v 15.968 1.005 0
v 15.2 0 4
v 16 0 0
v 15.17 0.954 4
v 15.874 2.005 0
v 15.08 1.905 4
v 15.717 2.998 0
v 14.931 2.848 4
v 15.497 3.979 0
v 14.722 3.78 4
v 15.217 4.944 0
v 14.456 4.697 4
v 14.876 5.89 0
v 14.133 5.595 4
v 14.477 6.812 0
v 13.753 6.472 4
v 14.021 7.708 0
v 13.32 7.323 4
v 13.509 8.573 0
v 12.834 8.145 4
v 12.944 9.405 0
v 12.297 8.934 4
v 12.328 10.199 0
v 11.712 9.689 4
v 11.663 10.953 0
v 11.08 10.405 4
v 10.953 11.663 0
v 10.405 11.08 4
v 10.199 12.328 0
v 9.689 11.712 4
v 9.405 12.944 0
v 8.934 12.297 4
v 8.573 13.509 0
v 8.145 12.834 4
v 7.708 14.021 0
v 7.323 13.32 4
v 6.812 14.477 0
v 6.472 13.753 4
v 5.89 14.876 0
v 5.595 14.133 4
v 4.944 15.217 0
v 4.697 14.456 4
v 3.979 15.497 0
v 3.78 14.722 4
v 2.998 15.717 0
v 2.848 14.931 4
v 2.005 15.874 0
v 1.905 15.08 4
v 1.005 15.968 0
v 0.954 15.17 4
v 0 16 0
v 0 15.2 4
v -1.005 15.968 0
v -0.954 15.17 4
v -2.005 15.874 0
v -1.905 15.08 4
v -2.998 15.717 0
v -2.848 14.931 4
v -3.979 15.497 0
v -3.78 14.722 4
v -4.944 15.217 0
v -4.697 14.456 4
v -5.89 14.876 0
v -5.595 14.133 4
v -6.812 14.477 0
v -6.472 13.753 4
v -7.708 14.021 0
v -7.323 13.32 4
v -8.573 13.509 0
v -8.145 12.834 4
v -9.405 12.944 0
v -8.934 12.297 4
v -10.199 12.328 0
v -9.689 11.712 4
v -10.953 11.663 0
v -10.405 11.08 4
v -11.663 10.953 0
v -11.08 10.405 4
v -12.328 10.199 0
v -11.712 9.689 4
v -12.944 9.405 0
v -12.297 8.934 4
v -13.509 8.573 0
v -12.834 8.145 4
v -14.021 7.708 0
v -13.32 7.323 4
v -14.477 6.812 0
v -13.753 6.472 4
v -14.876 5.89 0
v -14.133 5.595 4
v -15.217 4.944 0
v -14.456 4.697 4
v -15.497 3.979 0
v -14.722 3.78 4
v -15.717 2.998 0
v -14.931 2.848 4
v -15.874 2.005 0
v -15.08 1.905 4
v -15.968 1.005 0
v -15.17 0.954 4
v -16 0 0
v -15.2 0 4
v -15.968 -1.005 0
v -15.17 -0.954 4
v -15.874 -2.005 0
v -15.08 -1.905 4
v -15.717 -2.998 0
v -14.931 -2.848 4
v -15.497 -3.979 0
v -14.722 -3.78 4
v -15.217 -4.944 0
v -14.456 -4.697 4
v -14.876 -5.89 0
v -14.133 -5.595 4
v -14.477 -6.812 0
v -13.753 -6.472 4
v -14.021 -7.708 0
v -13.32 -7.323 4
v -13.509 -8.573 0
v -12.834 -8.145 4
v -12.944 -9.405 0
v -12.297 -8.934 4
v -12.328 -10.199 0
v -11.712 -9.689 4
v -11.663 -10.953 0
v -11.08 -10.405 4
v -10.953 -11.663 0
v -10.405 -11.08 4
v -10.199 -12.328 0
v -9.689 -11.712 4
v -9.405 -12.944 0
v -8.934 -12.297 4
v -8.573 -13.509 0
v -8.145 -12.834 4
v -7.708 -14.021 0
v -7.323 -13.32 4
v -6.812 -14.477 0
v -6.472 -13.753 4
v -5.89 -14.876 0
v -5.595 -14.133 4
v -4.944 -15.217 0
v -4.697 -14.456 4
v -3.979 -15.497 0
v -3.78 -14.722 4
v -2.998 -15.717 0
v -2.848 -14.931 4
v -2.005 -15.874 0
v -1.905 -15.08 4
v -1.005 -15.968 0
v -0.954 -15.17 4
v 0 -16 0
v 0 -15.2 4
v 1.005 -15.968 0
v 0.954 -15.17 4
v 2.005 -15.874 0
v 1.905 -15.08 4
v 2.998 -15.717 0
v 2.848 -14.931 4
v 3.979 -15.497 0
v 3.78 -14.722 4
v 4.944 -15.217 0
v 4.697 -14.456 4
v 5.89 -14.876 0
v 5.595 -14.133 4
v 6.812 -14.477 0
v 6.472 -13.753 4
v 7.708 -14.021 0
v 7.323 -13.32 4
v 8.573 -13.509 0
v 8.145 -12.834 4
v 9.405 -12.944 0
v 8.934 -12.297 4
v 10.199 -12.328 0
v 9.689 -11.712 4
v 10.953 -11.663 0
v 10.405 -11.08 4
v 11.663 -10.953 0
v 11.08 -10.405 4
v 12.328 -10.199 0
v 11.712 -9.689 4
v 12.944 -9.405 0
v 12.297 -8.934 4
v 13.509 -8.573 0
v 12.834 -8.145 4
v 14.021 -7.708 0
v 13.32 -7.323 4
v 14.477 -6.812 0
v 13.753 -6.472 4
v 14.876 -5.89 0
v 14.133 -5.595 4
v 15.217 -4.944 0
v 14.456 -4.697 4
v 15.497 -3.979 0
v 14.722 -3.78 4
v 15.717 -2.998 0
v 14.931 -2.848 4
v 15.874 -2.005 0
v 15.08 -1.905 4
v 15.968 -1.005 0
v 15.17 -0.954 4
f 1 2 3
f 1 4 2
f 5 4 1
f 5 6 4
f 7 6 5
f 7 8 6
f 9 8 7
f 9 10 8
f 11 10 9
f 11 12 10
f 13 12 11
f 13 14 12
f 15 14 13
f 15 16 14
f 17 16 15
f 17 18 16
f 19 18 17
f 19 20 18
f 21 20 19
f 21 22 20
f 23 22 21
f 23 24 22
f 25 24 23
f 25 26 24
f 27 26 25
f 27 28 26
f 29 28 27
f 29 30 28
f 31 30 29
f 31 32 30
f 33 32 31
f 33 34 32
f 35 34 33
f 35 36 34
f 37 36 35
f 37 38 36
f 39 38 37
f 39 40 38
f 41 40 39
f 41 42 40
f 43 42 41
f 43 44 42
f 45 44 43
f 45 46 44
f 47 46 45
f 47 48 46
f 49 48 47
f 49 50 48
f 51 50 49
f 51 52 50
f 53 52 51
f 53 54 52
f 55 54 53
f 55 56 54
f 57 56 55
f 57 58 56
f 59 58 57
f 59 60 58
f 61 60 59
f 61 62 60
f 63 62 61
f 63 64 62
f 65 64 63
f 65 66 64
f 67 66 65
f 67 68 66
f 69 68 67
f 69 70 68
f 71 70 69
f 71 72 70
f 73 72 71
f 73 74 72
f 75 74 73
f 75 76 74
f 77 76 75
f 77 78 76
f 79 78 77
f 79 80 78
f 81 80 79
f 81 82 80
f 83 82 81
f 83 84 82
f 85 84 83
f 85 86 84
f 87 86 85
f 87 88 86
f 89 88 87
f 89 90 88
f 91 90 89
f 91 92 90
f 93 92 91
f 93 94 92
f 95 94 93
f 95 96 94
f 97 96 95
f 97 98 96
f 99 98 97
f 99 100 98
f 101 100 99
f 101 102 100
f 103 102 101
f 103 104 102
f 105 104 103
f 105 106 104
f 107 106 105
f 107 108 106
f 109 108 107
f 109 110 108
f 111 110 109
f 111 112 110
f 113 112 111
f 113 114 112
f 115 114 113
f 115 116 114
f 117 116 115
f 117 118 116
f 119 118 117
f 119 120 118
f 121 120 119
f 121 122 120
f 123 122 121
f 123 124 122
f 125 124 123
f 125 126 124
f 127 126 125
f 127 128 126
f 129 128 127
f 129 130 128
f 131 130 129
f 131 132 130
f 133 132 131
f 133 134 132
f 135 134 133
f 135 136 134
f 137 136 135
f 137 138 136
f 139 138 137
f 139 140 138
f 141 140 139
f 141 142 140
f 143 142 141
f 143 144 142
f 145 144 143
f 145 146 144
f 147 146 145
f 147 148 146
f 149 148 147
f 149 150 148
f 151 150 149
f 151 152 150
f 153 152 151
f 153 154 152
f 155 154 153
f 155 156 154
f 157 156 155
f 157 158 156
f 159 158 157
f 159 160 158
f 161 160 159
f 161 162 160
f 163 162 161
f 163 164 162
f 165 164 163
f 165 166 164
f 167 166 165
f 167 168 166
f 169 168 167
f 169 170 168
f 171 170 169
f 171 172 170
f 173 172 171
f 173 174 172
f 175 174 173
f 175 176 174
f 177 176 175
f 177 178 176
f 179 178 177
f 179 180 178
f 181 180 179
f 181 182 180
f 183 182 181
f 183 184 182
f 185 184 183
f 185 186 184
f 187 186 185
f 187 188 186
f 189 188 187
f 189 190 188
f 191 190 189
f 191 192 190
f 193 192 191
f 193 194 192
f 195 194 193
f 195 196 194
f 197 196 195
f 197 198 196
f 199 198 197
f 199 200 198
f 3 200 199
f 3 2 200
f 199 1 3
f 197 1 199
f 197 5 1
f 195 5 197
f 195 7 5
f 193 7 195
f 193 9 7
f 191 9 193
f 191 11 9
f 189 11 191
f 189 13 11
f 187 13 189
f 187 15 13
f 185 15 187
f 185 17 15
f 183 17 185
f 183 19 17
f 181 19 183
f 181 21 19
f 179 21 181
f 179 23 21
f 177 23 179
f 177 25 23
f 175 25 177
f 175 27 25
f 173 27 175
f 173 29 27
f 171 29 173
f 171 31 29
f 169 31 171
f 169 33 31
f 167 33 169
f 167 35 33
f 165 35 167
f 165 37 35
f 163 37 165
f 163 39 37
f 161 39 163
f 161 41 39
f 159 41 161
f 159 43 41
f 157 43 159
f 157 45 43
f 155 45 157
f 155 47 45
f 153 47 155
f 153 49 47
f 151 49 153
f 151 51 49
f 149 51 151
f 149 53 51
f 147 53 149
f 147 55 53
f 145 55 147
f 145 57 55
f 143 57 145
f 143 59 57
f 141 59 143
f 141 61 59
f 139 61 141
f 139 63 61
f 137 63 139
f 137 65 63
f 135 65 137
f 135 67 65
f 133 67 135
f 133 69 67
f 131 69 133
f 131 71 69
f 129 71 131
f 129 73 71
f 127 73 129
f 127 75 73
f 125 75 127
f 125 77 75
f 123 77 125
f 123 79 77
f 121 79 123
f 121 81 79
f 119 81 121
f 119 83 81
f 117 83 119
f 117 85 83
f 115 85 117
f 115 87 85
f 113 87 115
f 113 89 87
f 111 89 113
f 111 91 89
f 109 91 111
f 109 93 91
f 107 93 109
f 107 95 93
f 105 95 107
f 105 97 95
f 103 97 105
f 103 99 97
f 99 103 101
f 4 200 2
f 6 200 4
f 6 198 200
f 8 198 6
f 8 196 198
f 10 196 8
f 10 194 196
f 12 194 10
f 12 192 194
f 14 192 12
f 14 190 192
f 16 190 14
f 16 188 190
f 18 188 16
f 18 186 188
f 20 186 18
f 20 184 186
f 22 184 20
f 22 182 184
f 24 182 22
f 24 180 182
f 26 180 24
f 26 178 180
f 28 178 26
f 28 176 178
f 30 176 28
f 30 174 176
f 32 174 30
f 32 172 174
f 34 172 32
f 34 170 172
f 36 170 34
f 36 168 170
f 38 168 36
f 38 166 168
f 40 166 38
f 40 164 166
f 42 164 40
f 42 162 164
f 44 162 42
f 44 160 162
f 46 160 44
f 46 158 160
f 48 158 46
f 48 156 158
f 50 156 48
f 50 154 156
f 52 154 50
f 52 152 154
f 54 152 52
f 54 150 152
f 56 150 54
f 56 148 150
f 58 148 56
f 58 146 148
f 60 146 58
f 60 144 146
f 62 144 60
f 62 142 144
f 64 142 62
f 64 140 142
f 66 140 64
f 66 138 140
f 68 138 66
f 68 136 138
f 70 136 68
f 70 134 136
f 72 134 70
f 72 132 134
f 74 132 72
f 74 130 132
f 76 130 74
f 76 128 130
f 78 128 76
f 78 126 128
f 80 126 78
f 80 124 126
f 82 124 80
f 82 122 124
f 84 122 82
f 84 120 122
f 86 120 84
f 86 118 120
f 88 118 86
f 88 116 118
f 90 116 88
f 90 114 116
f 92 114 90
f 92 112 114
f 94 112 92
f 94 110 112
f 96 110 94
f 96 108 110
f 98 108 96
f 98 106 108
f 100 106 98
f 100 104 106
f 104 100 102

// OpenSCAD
// file: build.scad
$build_id = "";

function building(filename) = is_undef(filename) ?
  !is_undef(build)
  : !is_undef(build) && build == filename;

function previewing() = !building();

module build(filename) {
  $build_id = filename;

  if(!is_undef(scad_build_scan) && scad_build_scan == true) {
    echo(str("scad_build_scan: ", filename));
  }
  else if(previewing() || build == filename) {
    children();
  }
}

module preview_row(spacing) {
  if(previewing()) {
    for(x = [0:1:$children - 1]) {
      translate([x * spacing, 0, 0]) {
        children(x);
      }
    }
  }
  else {
    children();
  }
}

module preview_column(spacing) {
  if(previewing()) {
    for(y = [0:1:$children - 1]) {
      translate([0, y * spacing, 0]) {
        children(y);
      }
    }
  }
  else {
    children();
  }
}
// file: minibase.scad
// Based off of titancraft's Customizable Miniature Base (CC0 1.0)
// https://www.thingiverse.com/thing:1112237

include <./build.scad>

$base_rim = 1; //	[1: tapered, 2: inclined, 3: flat]
// Number of sides:
$base_shape = 100; //	[30:Low-res Circle, 100: Hi-res Circle, 5:Pentagon, 6:Hexagon, 8:Octagon, 4:Square, 3:Triangle]

$base_diameter = 32;
$base_height = 4;
$base_slant = 95; // [50:100]

// Percentage:
$base_stretch = 100;

//('Cool' base only)
$base_inner_circle_ratio = 40; // [10:80]

module tapered(r=40) {
  $base_rim = 1;
  $base_inner_circle_ratio = r;

  children();
}

module inclined() {
  $base_rim = 2;

  children();
}

module flat() {
  $base_rim = 3;

  children();
}

module shape(s) {
  $base_shape = s;

  children();
}

module diameter(d) {
  $base_diameter = d;

  children();
}

module height(h) {
  $base_height = h;

  children();
}

module slant(s) {
  $base_slant = s;

  children();
}

module stretch(s) {
  $base_stretch = s;

  children();
}

module base(id) {
  build(id) union() {
    radius = $base_diameter/2;
    scale([$base_stretch/100, 1, 1]){
      if ($base_rim == 1){
        // tapered base
        cyl1_height = $base_height * (1-$base_inner_circle_ratio/100);
        cylinder(cyl1_height, radius, radius * $base_slant/100, $fn=$base_shape);

        cyl2_radius = radius  * $base_slant/100 * .95;
        cyl2_height = $base_height - cyl1_height;

        translate([0, 0, cyl1_height]){
          cylinder(cyl2_height, cyl2_radius, cyl2_radius * $base_slant/100, $fn=$base_shape);
          cylinder(cyl2_height*.5, radius * $base_slant/100, cyl2_radius, $fn=$base_shape);
        }
      } else if ($base_rim == 2){
        // inclined base
        cylinder($base_height, radius, radius * $base_slant/100, $fn=$base_shape);
      } else if ($base_rim == 3){
        // flat base

        cylinder($base_height, radius, radius, $fn=$base_shape);
      }
    }
  }
}
// main file
include <./minibase.scad>

inclined() diameter(32) base("32mm-opr-infantry");
